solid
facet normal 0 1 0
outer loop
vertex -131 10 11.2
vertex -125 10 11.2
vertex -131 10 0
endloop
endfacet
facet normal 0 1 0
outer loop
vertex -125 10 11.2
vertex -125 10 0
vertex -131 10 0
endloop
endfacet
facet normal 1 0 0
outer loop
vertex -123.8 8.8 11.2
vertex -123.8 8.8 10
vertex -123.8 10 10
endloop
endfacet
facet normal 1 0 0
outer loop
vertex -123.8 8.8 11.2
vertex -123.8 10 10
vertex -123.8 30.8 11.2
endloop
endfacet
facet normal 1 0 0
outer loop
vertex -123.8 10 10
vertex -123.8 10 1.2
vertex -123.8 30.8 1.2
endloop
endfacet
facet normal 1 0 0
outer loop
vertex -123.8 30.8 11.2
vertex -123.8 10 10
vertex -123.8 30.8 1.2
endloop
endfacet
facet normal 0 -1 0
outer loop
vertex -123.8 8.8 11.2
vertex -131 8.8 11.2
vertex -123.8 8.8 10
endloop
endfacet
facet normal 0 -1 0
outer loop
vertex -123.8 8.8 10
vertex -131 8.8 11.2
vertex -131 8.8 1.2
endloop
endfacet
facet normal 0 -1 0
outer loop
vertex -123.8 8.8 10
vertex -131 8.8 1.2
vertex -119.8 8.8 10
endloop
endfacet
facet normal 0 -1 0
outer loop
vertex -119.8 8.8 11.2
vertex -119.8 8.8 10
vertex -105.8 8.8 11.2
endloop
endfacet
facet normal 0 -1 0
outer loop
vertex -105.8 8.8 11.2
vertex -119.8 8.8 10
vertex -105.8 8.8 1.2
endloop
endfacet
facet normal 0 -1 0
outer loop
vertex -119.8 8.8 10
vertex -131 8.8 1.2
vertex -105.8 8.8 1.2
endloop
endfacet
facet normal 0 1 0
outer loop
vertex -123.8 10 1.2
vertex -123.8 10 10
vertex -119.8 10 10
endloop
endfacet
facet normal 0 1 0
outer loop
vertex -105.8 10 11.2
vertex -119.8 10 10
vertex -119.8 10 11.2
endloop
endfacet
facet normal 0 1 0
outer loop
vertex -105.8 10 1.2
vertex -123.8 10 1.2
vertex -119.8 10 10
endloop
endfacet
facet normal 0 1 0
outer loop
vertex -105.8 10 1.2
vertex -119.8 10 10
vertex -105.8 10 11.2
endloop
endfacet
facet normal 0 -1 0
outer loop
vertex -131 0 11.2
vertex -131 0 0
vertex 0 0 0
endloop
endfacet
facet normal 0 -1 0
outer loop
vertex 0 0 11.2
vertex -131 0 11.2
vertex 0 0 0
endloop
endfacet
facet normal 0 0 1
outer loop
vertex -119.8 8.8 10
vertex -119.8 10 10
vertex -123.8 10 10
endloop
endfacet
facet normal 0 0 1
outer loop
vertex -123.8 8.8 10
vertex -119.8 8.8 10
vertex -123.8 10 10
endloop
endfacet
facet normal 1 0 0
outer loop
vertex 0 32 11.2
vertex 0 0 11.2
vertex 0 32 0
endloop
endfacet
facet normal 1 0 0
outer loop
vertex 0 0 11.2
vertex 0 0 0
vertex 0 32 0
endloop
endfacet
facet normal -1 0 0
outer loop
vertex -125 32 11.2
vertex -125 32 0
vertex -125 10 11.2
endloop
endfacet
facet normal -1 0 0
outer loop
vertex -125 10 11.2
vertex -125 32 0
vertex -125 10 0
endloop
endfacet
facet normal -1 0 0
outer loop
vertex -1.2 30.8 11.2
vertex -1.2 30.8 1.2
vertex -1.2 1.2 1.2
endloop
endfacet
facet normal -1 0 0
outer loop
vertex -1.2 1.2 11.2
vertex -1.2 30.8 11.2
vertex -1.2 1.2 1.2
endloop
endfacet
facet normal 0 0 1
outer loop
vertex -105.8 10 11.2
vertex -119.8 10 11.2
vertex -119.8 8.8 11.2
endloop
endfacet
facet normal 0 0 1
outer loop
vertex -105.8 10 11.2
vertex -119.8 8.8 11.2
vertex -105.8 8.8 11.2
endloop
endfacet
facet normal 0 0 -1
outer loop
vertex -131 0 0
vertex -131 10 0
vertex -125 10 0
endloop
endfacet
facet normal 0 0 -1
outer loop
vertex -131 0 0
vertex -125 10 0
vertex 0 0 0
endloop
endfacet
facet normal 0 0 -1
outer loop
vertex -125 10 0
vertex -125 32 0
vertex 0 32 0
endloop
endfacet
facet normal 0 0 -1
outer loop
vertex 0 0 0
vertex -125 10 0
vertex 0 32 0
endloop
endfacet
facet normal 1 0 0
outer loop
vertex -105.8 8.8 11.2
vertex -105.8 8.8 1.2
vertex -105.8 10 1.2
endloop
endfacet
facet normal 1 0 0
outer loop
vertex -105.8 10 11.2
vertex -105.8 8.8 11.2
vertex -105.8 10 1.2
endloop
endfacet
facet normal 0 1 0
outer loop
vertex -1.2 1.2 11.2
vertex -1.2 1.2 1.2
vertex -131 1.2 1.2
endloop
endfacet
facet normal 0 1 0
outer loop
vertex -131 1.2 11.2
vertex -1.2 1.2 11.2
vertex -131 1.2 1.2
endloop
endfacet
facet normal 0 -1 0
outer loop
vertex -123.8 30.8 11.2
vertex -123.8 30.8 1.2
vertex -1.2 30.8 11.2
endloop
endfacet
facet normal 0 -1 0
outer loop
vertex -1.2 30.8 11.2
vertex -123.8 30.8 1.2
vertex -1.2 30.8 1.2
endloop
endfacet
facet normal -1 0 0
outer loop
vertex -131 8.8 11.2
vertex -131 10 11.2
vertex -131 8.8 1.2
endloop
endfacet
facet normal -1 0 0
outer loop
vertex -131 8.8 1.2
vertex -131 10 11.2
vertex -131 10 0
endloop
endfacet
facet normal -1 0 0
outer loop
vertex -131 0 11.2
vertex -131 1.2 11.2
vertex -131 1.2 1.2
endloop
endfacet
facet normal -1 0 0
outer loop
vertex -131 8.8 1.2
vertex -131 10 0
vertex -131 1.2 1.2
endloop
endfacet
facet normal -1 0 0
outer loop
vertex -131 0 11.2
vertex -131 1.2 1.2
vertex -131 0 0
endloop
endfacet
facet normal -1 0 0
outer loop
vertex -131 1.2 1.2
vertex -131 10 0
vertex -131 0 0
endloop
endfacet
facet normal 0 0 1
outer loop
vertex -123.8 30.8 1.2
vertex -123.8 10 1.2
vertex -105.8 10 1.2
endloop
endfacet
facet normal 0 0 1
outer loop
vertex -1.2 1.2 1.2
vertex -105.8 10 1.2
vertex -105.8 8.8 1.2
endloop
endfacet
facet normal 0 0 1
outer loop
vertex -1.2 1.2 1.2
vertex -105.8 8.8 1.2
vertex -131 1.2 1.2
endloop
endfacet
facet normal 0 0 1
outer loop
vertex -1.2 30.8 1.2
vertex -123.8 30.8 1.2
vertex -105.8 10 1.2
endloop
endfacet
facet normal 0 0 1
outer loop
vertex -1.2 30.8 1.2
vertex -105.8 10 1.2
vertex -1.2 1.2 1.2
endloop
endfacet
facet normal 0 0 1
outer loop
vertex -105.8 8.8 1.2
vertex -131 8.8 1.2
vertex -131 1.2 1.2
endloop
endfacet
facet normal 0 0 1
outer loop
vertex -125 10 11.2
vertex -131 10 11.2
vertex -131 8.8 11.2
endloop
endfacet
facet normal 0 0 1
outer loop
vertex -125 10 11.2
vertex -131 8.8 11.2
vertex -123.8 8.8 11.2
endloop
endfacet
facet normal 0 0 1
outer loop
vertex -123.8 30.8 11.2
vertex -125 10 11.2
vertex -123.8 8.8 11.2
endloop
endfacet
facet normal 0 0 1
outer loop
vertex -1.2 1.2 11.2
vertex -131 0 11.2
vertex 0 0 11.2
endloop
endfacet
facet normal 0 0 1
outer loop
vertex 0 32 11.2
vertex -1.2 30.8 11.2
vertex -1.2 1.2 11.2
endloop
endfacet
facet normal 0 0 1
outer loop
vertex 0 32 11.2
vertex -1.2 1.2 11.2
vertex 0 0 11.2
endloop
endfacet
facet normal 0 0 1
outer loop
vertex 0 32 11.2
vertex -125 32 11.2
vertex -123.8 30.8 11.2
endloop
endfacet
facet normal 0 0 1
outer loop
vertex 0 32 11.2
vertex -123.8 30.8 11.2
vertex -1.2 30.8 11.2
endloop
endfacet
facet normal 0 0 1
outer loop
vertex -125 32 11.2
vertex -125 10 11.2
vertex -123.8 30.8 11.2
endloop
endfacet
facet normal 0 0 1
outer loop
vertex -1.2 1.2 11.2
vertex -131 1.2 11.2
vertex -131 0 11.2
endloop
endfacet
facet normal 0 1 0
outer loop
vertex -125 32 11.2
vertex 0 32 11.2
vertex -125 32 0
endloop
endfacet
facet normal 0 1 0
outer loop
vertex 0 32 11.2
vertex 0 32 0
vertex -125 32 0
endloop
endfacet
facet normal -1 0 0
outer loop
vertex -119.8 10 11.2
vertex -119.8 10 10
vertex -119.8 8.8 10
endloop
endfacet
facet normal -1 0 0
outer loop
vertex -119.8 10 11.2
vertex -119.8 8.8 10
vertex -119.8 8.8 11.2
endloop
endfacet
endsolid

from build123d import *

# Parameters (mm, degrees)
F1_DEPTH = 1.2
F2_W     = 18
F2_H     = 1.2
F3_DEPTH = 10
F4_W     = 4
F4_H     = 1.2
F5_DEPTH = 1.2


with BuildPart() as f1:
    # F0 (on Top) → F1 (new body)
    with BuildSketch(Plane.XY):
        Polygon((-125, 0), (0, 0), (0, 32), (-125, 32), (-125, 10), (-131, 10), (-131, 0), align=None)
    extrude(amount=F1_DEPTH)

    # F2 (on face) → F3 (join)
    with BuildSketch(Plane.XY.offset(1.2)):
        Polygon((-131, 0), (0, 0), (0, 32), (-125, 32), (-125, 10), (-131, 10), (-131, 8.8), (-123.8, 8.8), (-123.8, 10), (-123.8, 30.8), (-1.2, 30.8), (-1.2, 1.2), (-131, 1.2), align=None)
        with Locations((-114.8, 9.4)):
            Rectangle(F2_W, F2_H)
    extrude(amount=F3_DEPTH)

    # F4 (on face) → F5 (cut, through all)
    with BuildSketch(Plane(origin=(0, 10, 0), x_dir=(-1, 0, 0), z_dir=(0, 1, 0))):
        with Locations((121.8, 10.6)):
            Rectangle(F4_W, F4_H)
    extrude(amount=-F5_DEPTH, mode=Mode.SUBTRACT)


solid = f1.part
